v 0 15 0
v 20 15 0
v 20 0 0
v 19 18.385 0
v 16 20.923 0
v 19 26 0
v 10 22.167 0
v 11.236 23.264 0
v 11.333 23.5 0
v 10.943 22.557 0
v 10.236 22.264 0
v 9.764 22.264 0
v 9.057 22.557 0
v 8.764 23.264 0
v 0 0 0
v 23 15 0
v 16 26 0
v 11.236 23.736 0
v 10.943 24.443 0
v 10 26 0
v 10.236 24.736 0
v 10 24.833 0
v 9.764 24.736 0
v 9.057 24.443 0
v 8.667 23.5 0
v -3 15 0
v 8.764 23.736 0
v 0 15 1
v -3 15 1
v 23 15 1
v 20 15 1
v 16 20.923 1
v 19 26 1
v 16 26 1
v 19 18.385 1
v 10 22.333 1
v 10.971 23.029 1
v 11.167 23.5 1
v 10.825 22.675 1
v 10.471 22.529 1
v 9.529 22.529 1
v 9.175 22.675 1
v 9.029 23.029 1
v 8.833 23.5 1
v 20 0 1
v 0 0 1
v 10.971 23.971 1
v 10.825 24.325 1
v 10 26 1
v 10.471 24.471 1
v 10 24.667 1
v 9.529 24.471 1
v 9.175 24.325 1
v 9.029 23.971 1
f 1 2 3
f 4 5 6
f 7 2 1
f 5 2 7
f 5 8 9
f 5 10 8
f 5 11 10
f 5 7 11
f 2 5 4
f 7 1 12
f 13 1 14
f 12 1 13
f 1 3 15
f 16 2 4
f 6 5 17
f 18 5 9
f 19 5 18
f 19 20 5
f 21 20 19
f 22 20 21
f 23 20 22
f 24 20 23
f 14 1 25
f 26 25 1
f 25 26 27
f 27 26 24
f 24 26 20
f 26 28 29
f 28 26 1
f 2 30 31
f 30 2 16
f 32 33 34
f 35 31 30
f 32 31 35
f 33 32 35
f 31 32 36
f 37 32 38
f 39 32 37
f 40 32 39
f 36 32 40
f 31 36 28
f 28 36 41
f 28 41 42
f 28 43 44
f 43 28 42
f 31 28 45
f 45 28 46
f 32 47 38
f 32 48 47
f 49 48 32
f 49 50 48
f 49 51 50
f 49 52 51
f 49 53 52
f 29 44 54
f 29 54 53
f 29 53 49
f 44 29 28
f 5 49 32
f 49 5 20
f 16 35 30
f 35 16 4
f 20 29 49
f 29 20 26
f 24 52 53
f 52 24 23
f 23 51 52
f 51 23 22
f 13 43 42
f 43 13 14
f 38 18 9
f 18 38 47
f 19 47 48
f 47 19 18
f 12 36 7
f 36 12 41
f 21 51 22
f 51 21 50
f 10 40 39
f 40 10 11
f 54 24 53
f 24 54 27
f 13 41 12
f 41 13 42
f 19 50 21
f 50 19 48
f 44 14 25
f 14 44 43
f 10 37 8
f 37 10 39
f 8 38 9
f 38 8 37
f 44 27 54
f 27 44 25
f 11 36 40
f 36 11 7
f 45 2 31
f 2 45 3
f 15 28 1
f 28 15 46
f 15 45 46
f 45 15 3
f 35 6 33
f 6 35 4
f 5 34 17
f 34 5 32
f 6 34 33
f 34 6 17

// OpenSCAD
// House keychain

module base(thickness) {
    cube([20, 15, thickness]);
    difference() {
    linear_extrude(thickness)
    polygon(points = [[-3,15], [23,15], [10,26]]);
    translate([10,23.5,-1])
    cylinder(thickness+2, 1.5, 1,5, $fn=8);
        }
    translate([16,18,0])
    cube([3, 8, thickness]);
    
    }
   

module upper_layer(thickness, number) {
    
    };
    
base(1);
